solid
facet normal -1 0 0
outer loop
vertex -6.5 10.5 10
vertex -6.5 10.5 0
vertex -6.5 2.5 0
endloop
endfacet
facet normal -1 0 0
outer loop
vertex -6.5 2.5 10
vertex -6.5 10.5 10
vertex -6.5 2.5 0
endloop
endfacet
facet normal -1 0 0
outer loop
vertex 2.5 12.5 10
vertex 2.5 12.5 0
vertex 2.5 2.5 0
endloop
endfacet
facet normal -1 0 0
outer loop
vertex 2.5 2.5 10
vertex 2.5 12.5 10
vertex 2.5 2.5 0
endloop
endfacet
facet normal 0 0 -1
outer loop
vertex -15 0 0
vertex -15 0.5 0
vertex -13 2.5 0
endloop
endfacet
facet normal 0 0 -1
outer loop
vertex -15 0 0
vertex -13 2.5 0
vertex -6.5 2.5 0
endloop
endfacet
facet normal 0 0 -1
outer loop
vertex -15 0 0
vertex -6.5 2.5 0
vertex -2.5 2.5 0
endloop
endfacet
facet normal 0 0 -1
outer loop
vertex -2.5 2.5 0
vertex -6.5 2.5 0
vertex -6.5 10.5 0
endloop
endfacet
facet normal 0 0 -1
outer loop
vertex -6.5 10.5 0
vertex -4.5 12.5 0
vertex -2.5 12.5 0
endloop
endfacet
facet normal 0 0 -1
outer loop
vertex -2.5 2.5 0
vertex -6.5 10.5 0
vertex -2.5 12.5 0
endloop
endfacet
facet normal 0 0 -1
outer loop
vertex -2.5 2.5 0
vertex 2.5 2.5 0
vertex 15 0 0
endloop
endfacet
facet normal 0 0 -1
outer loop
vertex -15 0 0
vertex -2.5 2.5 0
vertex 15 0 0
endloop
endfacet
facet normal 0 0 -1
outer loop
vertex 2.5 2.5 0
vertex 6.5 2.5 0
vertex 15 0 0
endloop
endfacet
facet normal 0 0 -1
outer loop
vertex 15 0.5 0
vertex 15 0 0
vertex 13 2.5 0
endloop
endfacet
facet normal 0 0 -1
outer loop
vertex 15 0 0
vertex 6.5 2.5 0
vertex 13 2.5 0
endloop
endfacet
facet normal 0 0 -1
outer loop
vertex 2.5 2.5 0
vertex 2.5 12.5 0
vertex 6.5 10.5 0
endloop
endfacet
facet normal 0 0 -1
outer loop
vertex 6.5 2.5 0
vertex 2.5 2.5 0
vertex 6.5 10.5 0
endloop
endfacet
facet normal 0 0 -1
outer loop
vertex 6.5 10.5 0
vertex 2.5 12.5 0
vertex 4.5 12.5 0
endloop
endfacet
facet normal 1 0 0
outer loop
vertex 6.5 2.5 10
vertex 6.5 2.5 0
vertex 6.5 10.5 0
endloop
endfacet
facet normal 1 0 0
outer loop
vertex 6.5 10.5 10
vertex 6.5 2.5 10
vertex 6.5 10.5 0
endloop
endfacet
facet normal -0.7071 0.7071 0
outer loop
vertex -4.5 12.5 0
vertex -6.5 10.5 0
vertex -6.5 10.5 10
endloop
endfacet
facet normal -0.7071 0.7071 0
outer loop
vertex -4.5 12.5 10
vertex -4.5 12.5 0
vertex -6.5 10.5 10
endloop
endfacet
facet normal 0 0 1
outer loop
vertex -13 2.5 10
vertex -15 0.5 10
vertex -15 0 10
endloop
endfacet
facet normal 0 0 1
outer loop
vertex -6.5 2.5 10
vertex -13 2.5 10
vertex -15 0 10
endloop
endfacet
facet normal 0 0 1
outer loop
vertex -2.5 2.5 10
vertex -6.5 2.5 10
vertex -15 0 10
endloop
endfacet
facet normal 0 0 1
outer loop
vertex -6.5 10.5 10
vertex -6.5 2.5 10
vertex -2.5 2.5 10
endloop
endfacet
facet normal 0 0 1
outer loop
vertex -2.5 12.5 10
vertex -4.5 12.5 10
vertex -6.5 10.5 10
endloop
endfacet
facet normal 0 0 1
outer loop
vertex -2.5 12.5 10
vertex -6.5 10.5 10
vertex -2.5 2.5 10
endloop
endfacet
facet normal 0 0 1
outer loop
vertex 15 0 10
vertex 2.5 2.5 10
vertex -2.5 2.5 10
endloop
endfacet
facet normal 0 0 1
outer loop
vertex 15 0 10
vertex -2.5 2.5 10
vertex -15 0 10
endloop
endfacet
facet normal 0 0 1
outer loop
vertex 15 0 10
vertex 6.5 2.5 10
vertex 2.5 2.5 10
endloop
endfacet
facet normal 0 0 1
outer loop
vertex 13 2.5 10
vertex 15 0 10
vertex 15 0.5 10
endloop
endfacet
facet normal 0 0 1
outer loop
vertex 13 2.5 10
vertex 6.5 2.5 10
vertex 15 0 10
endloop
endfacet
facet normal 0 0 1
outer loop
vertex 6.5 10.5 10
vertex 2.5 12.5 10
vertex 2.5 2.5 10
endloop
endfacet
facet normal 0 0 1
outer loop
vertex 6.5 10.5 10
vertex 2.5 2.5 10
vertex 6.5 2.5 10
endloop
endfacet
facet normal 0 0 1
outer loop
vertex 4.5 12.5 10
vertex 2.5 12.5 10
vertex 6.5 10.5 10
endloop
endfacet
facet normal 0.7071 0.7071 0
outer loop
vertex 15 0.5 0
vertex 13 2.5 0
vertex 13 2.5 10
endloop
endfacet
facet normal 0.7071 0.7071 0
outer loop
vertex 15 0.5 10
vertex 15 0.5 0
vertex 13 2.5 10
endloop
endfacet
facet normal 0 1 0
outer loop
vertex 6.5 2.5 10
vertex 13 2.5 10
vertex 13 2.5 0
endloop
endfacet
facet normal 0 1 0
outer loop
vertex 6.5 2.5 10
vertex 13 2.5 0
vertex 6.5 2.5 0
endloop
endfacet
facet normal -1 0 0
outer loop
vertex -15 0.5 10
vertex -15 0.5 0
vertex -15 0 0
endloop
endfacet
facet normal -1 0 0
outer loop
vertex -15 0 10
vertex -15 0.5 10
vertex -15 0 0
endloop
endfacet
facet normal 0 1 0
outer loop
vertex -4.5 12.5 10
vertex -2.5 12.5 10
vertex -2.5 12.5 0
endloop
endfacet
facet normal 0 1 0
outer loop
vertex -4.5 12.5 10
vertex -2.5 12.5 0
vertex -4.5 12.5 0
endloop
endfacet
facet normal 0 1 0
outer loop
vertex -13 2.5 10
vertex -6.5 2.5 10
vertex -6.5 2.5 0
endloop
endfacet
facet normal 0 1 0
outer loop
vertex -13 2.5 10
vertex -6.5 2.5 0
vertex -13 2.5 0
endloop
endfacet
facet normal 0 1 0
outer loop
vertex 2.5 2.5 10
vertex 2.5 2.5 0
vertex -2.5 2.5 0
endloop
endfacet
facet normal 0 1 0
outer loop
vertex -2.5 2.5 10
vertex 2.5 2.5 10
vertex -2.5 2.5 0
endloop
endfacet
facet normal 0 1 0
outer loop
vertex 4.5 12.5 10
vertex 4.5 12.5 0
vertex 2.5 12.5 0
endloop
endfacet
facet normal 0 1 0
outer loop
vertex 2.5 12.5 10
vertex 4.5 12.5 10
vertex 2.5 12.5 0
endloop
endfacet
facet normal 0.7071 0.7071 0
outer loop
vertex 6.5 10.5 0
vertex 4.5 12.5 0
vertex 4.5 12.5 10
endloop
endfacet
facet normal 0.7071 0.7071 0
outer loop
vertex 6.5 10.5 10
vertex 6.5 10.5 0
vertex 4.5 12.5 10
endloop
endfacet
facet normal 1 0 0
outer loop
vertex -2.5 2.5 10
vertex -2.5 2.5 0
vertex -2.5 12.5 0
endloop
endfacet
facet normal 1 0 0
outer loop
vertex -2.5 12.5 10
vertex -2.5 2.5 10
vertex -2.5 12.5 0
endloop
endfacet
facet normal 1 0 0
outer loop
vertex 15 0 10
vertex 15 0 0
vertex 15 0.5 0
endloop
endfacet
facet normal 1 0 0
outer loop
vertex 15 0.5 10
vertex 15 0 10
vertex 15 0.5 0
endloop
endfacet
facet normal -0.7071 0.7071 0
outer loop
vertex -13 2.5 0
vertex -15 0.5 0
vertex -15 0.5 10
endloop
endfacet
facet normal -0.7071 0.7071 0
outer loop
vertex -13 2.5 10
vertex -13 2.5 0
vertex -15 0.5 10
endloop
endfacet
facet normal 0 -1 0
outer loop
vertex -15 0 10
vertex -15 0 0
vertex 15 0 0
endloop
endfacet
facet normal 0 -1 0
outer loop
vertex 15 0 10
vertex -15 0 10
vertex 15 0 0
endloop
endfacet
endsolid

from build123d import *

# Parameters (mm, degrees)
F1_DEPTH = 10
F2_SIZE  = 2


with BuildPart() as f1:
    # F0 (on Top) → F1 (new body)
    with BuildSketch(Plane.XY):
        Polygon((-15, 0), (0, 0), (15, 0), (15, 2.5), (6.5, 2.5), (6.5, 12.5), (2.5, 12.5), (2.5, 2.5), (0, 2.5), (-2.5, 2.5), (-2.5, 12.5), (-6.5, 12.5), (-6.5, 2.5), (-15, 2.5), align=None)
    extrude(amount=F1_DEPTH)

    # F2
    f2_edges = [f1.edges().sort_by_distance(p)[0] for p in [
        (-6.5, 12.5, 5),
        (-15, 2.5, 5),
        (6.5, 12.5, 5),
        (15, 2.5, 5),
    ]]
    chamfer(f2_edges, length=F2_SIZE)


solid = f1.part
